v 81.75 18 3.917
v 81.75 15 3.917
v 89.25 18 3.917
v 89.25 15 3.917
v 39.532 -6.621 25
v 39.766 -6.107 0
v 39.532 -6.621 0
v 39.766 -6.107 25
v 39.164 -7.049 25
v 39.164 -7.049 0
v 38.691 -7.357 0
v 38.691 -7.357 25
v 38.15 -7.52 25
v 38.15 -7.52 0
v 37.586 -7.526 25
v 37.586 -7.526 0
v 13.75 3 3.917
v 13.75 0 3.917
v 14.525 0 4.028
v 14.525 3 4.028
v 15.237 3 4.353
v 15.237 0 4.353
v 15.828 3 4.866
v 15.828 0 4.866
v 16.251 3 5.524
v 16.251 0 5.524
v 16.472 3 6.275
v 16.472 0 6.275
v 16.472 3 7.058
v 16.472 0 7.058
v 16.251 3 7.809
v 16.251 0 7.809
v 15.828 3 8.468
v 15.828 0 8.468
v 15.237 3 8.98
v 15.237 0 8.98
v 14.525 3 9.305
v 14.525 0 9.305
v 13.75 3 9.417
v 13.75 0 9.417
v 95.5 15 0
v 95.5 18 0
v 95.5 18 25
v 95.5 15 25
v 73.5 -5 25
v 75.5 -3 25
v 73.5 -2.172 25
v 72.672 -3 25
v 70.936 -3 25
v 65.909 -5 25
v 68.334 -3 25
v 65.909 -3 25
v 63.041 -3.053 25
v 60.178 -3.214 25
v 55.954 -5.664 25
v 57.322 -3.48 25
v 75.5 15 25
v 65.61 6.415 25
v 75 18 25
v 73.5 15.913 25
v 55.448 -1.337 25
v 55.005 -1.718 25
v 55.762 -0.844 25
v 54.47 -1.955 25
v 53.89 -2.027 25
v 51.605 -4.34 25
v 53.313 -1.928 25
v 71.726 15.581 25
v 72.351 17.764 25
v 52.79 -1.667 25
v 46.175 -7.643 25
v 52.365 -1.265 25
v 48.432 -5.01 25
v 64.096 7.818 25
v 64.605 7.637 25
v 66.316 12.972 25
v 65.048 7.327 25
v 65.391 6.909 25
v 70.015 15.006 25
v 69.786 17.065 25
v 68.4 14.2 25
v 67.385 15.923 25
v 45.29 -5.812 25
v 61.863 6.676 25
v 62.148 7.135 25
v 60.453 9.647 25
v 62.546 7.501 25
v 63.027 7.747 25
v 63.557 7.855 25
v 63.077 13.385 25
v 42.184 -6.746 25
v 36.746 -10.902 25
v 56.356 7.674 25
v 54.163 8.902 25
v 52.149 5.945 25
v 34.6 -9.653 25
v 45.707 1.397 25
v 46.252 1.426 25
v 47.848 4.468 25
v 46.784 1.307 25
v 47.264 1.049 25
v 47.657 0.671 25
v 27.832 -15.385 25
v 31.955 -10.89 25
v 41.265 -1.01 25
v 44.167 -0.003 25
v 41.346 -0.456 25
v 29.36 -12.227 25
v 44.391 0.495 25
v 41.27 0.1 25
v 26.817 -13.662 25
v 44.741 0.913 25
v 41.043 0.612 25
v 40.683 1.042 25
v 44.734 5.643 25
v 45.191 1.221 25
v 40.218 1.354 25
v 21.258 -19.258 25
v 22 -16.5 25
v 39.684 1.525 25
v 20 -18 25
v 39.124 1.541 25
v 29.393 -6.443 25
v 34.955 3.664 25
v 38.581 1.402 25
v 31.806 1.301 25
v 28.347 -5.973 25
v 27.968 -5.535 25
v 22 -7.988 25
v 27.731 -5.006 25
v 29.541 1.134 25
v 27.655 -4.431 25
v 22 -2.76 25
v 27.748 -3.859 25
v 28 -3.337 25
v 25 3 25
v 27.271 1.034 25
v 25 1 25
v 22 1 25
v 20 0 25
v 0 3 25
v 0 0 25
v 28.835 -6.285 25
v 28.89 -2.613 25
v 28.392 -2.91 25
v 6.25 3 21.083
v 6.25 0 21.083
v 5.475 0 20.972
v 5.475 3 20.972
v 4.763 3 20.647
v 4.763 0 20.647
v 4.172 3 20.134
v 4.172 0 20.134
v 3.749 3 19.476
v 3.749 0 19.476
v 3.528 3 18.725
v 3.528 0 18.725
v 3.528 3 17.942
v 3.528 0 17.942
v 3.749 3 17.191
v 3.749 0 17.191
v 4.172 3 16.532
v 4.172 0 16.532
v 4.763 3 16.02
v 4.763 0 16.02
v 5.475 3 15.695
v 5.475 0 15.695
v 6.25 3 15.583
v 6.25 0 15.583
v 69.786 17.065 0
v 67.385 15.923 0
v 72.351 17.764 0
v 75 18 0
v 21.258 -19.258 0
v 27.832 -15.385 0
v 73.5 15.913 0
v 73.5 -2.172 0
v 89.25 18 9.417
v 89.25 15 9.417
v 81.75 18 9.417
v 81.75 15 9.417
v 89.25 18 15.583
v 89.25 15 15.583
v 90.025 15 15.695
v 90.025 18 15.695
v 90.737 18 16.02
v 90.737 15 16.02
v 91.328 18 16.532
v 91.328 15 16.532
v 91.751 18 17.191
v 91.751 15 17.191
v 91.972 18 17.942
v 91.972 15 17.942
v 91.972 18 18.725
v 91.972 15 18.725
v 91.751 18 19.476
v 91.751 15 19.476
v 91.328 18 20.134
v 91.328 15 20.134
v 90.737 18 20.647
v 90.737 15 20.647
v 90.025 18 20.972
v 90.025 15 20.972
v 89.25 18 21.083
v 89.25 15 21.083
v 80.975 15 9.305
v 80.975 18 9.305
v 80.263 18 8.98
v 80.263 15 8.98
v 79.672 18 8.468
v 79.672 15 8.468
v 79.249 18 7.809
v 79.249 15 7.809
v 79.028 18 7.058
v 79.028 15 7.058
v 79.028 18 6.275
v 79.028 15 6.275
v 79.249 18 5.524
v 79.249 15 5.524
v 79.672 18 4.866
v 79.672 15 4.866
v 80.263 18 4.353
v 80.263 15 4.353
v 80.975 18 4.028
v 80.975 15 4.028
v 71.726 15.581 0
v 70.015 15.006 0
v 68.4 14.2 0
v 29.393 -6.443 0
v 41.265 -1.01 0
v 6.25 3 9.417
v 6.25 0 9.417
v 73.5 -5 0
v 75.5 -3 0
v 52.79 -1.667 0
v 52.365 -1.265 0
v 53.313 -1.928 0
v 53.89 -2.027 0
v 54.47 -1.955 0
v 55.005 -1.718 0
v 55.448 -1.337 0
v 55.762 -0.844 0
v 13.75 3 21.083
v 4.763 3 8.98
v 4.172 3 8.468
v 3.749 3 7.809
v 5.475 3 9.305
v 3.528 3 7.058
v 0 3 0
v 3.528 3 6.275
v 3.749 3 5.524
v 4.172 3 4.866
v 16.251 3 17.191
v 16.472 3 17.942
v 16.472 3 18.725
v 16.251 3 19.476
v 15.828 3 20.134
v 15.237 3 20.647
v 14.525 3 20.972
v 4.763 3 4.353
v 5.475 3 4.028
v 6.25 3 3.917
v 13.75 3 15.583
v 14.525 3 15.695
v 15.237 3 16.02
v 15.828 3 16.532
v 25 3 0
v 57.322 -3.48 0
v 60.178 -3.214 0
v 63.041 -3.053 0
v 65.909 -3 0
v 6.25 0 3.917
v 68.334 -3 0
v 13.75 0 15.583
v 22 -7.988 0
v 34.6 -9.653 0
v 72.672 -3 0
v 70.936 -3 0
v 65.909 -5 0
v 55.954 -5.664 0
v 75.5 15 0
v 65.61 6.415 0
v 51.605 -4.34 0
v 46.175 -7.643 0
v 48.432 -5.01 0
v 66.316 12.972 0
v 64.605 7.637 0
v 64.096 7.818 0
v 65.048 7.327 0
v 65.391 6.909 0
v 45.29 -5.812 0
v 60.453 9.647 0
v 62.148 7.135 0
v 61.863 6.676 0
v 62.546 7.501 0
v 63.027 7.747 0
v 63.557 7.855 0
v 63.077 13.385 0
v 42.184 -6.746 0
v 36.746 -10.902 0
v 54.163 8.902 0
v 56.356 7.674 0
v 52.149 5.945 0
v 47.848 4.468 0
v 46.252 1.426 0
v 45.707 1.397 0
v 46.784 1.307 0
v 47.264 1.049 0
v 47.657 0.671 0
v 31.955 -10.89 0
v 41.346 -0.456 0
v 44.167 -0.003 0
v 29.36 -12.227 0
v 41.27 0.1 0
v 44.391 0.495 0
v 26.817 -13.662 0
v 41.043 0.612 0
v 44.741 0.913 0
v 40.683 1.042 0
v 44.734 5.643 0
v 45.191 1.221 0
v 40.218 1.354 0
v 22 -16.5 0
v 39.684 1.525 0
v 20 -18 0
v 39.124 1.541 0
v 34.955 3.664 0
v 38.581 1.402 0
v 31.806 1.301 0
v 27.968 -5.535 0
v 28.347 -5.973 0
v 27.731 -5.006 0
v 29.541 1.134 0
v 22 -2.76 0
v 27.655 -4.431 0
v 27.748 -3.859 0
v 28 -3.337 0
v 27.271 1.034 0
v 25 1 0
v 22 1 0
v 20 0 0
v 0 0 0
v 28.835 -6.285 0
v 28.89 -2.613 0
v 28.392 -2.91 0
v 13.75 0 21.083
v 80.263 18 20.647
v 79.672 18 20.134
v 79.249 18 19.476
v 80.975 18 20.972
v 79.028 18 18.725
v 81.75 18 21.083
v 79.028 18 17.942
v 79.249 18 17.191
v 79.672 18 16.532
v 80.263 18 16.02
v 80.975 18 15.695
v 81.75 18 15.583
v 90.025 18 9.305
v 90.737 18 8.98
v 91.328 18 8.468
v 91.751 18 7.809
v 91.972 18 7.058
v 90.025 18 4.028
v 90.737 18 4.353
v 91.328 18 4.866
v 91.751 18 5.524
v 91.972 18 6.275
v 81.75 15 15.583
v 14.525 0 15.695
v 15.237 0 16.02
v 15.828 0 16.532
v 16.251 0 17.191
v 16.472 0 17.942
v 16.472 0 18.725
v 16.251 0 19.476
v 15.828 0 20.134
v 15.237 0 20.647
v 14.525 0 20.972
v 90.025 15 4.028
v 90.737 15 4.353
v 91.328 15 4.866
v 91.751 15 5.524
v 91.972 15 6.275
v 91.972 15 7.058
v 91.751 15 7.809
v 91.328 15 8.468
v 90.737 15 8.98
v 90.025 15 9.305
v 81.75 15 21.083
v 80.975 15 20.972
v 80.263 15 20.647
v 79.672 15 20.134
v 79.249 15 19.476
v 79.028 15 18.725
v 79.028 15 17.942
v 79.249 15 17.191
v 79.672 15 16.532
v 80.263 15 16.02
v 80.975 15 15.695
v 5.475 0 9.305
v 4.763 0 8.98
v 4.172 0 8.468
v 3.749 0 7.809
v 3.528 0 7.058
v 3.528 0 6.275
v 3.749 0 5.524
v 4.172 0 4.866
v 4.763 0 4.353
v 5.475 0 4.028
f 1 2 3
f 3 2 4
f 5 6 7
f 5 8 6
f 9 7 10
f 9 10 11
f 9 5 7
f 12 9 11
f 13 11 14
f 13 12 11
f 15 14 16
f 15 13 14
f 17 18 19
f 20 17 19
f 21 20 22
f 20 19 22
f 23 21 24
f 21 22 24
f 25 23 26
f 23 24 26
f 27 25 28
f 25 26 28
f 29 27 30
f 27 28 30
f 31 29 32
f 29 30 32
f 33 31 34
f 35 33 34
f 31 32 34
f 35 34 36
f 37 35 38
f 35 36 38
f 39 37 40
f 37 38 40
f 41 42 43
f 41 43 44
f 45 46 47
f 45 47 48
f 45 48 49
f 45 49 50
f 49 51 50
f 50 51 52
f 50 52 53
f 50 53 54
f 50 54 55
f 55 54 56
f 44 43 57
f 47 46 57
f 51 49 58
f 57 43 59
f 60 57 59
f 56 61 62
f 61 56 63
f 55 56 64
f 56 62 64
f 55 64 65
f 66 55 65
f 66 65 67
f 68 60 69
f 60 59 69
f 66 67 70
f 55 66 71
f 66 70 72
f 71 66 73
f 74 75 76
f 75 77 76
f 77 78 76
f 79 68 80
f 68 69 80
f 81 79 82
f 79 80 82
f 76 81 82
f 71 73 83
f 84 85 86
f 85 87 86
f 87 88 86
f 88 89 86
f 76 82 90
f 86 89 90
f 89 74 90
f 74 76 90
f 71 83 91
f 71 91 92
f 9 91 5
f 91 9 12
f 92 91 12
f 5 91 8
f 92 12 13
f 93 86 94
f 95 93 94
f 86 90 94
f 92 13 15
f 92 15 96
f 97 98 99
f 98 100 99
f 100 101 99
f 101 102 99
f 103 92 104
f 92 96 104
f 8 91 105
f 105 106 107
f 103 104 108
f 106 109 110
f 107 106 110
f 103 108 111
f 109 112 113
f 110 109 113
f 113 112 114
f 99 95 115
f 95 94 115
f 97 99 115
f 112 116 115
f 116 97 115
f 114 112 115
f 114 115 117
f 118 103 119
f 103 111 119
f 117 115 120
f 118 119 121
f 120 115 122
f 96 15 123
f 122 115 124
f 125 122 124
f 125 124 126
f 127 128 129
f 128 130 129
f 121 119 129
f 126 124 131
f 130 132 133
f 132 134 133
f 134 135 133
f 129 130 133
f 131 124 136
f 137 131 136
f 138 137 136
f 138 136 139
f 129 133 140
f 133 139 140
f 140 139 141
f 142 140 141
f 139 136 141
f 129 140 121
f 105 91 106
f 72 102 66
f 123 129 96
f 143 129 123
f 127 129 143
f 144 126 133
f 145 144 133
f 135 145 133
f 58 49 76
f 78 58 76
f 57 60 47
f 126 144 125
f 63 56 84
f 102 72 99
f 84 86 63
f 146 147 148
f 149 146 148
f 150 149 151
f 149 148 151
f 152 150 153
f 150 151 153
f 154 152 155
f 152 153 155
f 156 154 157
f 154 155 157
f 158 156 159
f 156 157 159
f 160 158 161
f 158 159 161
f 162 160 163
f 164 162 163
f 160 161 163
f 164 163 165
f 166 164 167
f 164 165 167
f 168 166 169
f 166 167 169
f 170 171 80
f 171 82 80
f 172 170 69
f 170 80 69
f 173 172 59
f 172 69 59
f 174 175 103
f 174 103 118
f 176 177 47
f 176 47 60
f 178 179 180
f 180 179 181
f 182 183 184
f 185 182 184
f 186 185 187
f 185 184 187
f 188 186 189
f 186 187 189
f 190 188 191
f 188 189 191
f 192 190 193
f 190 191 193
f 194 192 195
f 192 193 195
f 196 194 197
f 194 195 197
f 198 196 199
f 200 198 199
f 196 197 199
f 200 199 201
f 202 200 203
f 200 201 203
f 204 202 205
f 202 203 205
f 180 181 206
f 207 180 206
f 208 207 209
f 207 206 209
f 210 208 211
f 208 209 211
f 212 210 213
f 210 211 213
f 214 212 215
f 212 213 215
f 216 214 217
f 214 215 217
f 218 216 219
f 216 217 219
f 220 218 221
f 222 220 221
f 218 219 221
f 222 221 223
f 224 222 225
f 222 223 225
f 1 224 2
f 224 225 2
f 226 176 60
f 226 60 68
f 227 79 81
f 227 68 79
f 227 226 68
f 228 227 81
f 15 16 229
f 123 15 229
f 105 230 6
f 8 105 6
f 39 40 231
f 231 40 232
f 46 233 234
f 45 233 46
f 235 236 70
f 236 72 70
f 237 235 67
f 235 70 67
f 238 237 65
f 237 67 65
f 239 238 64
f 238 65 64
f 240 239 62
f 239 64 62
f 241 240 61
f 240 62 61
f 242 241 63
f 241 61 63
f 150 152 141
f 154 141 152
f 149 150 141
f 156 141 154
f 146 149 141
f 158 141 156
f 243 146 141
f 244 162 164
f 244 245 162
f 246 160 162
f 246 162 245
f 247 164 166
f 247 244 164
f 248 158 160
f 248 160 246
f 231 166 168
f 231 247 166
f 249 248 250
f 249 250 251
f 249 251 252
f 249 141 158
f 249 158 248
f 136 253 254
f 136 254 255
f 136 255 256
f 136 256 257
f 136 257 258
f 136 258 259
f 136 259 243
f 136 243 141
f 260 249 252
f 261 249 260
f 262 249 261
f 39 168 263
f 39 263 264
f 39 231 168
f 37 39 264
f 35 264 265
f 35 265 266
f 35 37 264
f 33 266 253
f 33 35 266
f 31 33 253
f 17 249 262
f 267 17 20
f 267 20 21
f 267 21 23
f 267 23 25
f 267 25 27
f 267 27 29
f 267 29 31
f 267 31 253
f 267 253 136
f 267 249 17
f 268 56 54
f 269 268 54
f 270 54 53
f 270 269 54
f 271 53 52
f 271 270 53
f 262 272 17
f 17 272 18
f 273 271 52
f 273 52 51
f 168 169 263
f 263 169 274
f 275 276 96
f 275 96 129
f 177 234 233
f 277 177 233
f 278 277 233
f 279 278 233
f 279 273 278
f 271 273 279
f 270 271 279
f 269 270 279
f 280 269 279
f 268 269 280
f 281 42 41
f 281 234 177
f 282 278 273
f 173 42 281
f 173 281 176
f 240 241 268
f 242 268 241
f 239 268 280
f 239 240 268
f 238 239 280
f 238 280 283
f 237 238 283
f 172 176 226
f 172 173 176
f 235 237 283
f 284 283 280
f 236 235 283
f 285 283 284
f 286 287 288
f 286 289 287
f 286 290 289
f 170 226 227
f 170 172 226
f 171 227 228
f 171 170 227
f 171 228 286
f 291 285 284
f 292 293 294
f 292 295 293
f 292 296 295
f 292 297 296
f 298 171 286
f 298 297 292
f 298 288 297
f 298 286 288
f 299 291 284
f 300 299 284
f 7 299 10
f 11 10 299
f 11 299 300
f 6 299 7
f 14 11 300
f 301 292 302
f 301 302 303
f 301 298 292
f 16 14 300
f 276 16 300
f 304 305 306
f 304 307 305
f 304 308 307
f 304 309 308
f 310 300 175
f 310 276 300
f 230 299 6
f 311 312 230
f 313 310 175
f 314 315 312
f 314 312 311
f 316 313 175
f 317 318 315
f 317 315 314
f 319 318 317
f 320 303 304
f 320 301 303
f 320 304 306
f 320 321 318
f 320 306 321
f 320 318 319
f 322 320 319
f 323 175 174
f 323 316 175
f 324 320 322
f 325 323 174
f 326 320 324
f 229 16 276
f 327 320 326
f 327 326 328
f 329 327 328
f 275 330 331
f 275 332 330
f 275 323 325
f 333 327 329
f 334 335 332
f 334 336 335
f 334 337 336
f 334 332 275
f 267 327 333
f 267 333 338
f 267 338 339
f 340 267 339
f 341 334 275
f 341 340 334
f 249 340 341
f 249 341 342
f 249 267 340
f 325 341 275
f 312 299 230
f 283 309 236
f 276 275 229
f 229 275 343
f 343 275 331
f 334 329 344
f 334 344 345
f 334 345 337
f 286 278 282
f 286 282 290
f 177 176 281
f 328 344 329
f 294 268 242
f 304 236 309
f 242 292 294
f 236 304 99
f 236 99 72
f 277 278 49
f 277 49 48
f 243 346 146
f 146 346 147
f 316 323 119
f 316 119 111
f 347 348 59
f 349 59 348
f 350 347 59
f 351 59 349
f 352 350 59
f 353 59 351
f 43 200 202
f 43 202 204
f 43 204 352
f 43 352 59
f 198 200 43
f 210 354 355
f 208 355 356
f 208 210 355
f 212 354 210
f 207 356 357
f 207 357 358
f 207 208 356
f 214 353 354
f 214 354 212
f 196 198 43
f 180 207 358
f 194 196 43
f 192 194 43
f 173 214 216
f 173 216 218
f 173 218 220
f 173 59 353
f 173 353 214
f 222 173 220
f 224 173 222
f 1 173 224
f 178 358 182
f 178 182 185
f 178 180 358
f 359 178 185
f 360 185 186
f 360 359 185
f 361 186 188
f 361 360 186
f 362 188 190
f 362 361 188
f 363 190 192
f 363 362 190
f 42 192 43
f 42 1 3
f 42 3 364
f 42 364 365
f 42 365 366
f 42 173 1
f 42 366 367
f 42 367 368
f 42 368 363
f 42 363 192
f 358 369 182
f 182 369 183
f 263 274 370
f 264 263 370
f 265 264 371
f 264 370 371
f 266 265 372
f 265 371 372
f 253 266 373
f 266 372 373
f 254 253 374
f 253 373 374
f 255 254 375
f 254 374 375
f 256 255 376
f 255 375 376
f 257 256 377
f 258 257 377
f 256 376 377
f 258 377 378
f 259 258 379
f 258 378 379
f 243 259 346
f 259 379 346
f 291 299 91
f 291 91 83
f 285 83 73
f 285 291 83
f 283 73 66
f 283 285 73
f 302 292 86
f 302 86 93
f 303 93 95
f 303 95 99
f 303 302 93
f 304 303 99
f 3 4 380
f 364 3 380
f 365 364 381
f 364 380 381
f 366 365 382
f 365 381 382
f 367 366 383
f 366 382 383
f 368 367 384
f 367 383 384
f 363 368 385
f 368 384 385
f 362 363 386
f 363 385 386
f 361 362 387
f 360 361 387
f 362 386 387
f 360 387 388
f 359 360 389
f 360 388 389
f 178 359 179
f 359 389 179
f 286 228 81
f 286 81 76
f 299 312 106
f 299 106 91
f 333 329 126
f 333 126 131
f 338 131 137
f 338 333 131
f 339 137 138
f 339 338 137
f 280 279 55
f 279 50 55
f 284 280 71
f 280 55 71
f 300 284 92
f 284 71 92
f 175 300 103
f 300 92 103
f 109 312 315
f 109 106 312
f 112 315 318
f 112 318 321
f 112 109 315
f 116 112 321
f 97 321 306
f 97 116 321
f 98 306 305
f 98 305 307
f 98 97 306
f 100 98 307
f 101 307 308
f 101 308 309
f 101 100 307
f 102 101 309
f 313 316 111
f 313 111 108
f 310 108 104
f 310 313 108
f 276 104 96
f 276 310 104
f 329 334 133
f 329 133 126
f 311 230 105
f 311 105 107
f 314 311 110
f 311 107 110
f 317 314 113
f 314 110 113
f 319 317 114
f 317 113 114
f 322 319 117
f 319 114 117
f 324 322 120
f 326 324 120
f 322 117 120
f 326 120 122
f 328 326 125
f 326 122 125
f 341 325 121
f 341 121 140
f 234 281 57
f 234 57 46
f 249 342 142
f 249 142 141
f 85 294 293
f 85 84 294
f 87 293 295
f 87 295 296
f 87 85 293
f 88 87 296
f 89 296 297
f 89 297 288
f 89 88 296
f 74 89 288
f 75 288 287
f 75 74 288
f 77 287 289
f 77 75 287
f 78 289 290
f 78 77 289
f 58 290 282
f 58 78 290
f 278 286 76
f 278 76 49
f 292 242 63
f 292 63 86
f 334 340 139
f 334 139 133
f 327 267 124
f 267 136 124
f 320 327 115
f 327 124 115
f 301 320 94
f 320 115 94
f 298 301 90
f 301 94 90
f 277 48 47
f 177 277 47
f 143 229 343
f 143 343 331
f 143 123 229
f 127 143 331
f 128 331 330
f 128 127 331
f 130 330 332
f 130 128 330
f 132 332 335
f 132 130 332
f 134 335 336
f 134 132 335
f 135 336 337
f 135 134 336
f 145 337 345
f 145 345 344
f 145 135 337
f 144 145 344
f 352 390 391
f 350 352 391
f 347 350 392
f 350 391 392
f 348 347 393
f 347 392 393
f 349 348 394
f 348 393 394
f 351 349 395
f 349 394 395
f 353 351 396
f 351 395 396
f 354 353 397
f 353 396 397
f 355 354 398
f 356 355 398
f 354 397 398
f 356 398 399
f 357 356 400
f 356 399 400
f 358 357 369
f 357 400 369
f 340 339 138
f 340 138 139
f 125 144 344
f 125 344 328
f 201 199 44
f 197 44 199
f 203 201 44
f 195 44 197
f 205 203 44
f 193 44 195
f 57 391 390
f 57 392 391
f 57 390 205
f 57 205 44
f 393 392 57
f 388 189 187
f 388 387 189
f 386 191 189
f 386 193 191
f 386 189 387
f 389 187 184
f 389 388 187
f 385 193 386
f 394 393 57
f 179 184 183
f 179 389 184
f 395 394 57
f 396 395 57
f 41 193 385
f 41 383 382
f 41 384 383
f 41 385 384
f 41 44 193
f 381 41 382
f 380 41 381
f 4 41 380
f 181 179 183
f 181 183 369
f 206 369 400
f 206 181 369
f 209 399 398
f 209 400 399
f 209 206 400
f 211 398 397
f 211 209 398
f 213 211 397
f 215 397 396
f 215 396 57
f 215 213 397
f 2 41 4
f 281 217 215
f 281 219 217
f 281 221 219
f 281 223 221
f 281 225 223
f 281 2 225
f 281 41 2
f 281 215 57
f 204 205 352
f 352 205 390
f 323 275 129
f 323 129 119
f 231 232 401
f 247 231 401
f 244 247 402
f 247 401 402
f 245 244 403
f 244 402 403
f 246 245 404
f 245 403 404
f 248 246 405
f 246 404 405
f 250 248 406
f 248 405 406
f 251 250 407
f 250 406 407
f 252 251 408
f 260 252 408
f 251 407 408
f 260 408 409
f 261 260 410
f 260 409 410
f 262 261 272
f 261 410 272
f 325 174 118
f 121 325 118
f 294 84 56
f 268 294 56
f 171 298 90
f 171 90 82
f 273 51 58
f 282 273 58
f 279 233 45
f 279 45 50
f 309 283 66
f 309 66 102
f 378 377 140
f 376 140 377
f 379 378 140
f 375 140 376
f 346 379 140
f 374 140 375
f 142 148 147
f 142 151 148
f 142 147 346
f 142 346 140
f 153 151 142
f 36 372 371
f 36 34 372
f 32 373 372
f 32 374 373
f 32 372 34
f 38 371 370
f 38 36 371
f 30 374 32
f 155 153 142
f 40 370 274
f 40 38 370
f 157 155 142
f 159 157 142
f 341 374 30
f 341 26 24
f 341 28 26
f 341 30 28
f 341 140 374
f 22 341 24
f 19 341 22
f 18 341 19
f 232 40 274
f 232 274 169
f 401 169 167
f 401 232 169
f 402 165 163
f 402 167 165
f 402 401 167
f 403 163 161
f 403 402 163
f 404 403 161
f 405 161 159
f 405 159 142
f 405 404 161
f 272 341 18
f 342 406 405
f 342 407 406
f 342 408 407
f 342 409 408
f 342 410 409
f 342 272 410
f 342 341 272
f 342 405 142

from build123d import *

# Parameters (mm, degrees)
BOSS_EXTRUDE1_DEPTH     = 25
CUT_EXTRUDE2_DEPTH      = 102.361975119
CUT_EXTRUDE2_DEPTH_BACK = 102.361975119
FILLET2_R               = 75
FILLET3_R               = 15
CHAMFER2_SIZE           = 2
CHAMFER3_SIZE           = 2
CHAMFER3_SIZE2          = 1.460674157
CUT_EXTRUDE3_DEPTH      = 101.57900879
CUT_EXTRUDE3_DEPTH_BACK = 101.57900879
FILLET4_R               = 2


with BuildPart() as part:
    # Sketch1 → Boss-Extrude1 (new body)
    with BuildSketch(Plane.XY):
        Polygon((0, 0), (0, 3), (45.454545455, 3), (70.909090909, 18), (95.5, 18), (95.5, 15), (75.5, 15), (75.5, -5), (45.454545455, -5), (20, -20), (20, 0), align=None)
    extrude(amount=BOSS_EXTRUDE1_DEPTH)

    # Sketch3 → Cut-Extrude2 (cut, two sides: drawn at the far end of the back side and taken through both)
    with BuildSketch(Plane(origin=(0, 3, 0), x_dir=(1, 0, 0), z_dir=(0, 1, 0)).offset(-CUT_EXTRUDE2_DEPTH_BACK)):
        with BuildLine():
            Line((6.25, -3.916666667), (13.75, -3.916666667))
            ThreePointArc((13.75, -3.916666667), (16.5, -6.666666667), (13.75, -9.416666667))
            Line((13.75, -9.416666667), (6.25, -9.416666667))
            ThreePointArc((6.25, -9.416666667), (3.5, -6.666666667), (6.25, -3.916666667))
        make_face()
        with BuildLine():
            Line((6.25, -15.583333333), (13.75, -15.583333333))
            ThreePointArc((13.75, -15.583333333), (16.5, -18.333333333), (13.75, -21.083333333))
            Line((13.75, -21.083333333), (6.25, -21.083333333))
            ThreePointArc((6.25, -21.083333333), (3.5, -18.333333333), (6.25, -15.583333333))
        make_face()
        with BuildLine():
            Line((81.75, -3.916666667), (89.25, -3.916666667))
            ThreePointArc((89.25, -3.916666667), (92, -6.666666667), (89.25, -9.416666667))
            Line((89.25, -9.416666667), (81.75, -9.416666667))
            ThreePointArc((81.75, -9.416666667), (79, -6.666666667), (81.75, -3.916666667))
        make_face()
        with BuildLine():
            Line((81.75, -15.583333333), (89.25, -15.583333333))
            ThreePointArc((89.25, -15.583333333), (92, -18.333333333), (89.25, -21.083333333))
            Line((89.25, -21.083333333), (81.75, -21.083333333))
            ThreePointArc((81.75, -21.083333333), (79, -18.333333333), (81.75, -15.583333333))
        make_face()
    extrude(amount=CUT_EXTRUDE2_DEPTH + CUT_EXTRUDE2_DEPTH_BACK, mode=Mode.SUBTRACT)

    # Fillet2
    fillet2_edges = [part.edges().sort_by_distance(p)[0] for p in [
        (45.454545455, -5, 12.5),
        (45.454545455, 3, 12.5),
    ]]
    fillet(fillet2_edges, radius=FILLET2_R)

    # Fillet3
    fillet3_edges = [part.edges().sort_by_distance(p)[0] for p in [
        (70.909090909, 18, 12.5),
    ]]
    fillet(fillet3_edges, radius=FILLET3_R)

    # Chamfer2
    chamfer2_edges = [part.edges().sort_by_distance(p)[0] for p in [
        (75.5, -5, 12.5),
    ]]
    chamfer(chamfer2_edges, length=CHAMFER2_SIZE)

    # Chamfer3
    chamfer3_edges = [part.edges().sort_by_distance(p)[0] for p in [
        (20, -20, 12.5),
    ]]
    chamfer3_side = [part.faces().sort_by_distance(p)[0] for p in [
        (20, -10, 12.5),
    ]]
    chamfer(chamfer3_edges, length=CHAMFER3_SIZE, length2=CHAMFER3_SIZE2, reference=chamfer3_side[0])

    # Sketch4 → Cut-Extrude3 (cut, two sides: drawn at the far end of the back side and taken through both)
    with BuildSketch(Plane.XY.offset(25).offset(-CUT_EXTRUDE3_DEPTH_BACK)):
        with BuildLine():
            Line((22, -2.760448796), (31.806154392, 1.301393348))
            ThreePointArc((31.806154392, 1.301393348), (28.406412173, 1.075385239), (25, 1))
            Line((25, 1), (22, 1))
            Line((22, 1), (22, -2.760448796))
        make_face()
        Polygon((42.445109464, 3.002212327), (39.283210642, -7.75), (22, -5.466429297), align=None)
        with BuildLine():
            ThreePointArc((26.816783217, -13.661538462), (30.651168911, -11.546519911), (34.599587235, -9.652896437))
            Line((34.599587235, -9.652896437), (22, -7.988156657))
            Line((22, -7.988156657), (22, -16.5))
            Line((22, -16.5), (26.816783217, -13.661538462))
        make_face()
        with BuildLine():
            ThreePointArc((42.184281307, -6.746103112), (46.856714422, -5.394323606), (51.605173683, -4.340248798))
            Line((51.605173683, -4.340248798), (45.260040246, 3.713185765))
            Line((45.260040246, 3.713185765), (42.184281307, -6.746103112))
        make_face()
        with BuildLine():
            Line((54.412012222, -3.863168035), (60.453180003, 9.647443152))
            ThreePointArc((60.453180003, 9.647443152), (54.265454394, 6.778281549), (47.848106587, 4.467938793))
            Line((47.848106587, 4.467938793), (54.412012222, -3.863168035))
        make_face()
        with BuildLine():
            Line((68.333642683, -3), (64.092307692, 11.661538462))
            Line((64.092307692, 11.661538462), (57.321727635, -3.480347675))
            ThreePointArc((57.321727635, -3.480347675), (61.608697267, -3.120180707), (65.909090909, -3))
            Line((65.909090909, -3), (68.333642683, -3))
        make_face()
        with BuildLine():
            Line((68.4, 14.2), (66.315776542, 12.971796891))
            Line((66.315776542, 12.971796891), (70.936147126, -3))
            Line((70.936147126, -3), (72.671572875, -3))
            Line((72.671572875, -3), (73.5, -2.171572875))
            Line((73.5, -2.171572875), (73.5, 15.91317157))
            ThreePointArc((73.5, 15.91317157), (70.860405913, 15.323301538), (68.4, 14.2))
        make_face()
    extrude(amount=CUT_EXTRUDE3_DEPTH + CUT_EXTRUDE3_DEPTH_BACK, mode=Mode.SUBTRACT)

    # Fillet4
    fillet4_edges = [part.edges().sort_by_distance(p)[0] for p in [
        (45.260040246, 3.713185765, 12.5),
        (54.412012222, -3.863168035, 12.5),
        (42.445109464, 3.002212327, 12.5),
        (39.283210642, -7.75, 12.5),
        (22, -5.466429297, 12.5),
        (64.092307692, 11.661538462, 12.5),
    ]]
    fillet(fillet4_edges, radius=FILLET4_R)


solid = part.part
